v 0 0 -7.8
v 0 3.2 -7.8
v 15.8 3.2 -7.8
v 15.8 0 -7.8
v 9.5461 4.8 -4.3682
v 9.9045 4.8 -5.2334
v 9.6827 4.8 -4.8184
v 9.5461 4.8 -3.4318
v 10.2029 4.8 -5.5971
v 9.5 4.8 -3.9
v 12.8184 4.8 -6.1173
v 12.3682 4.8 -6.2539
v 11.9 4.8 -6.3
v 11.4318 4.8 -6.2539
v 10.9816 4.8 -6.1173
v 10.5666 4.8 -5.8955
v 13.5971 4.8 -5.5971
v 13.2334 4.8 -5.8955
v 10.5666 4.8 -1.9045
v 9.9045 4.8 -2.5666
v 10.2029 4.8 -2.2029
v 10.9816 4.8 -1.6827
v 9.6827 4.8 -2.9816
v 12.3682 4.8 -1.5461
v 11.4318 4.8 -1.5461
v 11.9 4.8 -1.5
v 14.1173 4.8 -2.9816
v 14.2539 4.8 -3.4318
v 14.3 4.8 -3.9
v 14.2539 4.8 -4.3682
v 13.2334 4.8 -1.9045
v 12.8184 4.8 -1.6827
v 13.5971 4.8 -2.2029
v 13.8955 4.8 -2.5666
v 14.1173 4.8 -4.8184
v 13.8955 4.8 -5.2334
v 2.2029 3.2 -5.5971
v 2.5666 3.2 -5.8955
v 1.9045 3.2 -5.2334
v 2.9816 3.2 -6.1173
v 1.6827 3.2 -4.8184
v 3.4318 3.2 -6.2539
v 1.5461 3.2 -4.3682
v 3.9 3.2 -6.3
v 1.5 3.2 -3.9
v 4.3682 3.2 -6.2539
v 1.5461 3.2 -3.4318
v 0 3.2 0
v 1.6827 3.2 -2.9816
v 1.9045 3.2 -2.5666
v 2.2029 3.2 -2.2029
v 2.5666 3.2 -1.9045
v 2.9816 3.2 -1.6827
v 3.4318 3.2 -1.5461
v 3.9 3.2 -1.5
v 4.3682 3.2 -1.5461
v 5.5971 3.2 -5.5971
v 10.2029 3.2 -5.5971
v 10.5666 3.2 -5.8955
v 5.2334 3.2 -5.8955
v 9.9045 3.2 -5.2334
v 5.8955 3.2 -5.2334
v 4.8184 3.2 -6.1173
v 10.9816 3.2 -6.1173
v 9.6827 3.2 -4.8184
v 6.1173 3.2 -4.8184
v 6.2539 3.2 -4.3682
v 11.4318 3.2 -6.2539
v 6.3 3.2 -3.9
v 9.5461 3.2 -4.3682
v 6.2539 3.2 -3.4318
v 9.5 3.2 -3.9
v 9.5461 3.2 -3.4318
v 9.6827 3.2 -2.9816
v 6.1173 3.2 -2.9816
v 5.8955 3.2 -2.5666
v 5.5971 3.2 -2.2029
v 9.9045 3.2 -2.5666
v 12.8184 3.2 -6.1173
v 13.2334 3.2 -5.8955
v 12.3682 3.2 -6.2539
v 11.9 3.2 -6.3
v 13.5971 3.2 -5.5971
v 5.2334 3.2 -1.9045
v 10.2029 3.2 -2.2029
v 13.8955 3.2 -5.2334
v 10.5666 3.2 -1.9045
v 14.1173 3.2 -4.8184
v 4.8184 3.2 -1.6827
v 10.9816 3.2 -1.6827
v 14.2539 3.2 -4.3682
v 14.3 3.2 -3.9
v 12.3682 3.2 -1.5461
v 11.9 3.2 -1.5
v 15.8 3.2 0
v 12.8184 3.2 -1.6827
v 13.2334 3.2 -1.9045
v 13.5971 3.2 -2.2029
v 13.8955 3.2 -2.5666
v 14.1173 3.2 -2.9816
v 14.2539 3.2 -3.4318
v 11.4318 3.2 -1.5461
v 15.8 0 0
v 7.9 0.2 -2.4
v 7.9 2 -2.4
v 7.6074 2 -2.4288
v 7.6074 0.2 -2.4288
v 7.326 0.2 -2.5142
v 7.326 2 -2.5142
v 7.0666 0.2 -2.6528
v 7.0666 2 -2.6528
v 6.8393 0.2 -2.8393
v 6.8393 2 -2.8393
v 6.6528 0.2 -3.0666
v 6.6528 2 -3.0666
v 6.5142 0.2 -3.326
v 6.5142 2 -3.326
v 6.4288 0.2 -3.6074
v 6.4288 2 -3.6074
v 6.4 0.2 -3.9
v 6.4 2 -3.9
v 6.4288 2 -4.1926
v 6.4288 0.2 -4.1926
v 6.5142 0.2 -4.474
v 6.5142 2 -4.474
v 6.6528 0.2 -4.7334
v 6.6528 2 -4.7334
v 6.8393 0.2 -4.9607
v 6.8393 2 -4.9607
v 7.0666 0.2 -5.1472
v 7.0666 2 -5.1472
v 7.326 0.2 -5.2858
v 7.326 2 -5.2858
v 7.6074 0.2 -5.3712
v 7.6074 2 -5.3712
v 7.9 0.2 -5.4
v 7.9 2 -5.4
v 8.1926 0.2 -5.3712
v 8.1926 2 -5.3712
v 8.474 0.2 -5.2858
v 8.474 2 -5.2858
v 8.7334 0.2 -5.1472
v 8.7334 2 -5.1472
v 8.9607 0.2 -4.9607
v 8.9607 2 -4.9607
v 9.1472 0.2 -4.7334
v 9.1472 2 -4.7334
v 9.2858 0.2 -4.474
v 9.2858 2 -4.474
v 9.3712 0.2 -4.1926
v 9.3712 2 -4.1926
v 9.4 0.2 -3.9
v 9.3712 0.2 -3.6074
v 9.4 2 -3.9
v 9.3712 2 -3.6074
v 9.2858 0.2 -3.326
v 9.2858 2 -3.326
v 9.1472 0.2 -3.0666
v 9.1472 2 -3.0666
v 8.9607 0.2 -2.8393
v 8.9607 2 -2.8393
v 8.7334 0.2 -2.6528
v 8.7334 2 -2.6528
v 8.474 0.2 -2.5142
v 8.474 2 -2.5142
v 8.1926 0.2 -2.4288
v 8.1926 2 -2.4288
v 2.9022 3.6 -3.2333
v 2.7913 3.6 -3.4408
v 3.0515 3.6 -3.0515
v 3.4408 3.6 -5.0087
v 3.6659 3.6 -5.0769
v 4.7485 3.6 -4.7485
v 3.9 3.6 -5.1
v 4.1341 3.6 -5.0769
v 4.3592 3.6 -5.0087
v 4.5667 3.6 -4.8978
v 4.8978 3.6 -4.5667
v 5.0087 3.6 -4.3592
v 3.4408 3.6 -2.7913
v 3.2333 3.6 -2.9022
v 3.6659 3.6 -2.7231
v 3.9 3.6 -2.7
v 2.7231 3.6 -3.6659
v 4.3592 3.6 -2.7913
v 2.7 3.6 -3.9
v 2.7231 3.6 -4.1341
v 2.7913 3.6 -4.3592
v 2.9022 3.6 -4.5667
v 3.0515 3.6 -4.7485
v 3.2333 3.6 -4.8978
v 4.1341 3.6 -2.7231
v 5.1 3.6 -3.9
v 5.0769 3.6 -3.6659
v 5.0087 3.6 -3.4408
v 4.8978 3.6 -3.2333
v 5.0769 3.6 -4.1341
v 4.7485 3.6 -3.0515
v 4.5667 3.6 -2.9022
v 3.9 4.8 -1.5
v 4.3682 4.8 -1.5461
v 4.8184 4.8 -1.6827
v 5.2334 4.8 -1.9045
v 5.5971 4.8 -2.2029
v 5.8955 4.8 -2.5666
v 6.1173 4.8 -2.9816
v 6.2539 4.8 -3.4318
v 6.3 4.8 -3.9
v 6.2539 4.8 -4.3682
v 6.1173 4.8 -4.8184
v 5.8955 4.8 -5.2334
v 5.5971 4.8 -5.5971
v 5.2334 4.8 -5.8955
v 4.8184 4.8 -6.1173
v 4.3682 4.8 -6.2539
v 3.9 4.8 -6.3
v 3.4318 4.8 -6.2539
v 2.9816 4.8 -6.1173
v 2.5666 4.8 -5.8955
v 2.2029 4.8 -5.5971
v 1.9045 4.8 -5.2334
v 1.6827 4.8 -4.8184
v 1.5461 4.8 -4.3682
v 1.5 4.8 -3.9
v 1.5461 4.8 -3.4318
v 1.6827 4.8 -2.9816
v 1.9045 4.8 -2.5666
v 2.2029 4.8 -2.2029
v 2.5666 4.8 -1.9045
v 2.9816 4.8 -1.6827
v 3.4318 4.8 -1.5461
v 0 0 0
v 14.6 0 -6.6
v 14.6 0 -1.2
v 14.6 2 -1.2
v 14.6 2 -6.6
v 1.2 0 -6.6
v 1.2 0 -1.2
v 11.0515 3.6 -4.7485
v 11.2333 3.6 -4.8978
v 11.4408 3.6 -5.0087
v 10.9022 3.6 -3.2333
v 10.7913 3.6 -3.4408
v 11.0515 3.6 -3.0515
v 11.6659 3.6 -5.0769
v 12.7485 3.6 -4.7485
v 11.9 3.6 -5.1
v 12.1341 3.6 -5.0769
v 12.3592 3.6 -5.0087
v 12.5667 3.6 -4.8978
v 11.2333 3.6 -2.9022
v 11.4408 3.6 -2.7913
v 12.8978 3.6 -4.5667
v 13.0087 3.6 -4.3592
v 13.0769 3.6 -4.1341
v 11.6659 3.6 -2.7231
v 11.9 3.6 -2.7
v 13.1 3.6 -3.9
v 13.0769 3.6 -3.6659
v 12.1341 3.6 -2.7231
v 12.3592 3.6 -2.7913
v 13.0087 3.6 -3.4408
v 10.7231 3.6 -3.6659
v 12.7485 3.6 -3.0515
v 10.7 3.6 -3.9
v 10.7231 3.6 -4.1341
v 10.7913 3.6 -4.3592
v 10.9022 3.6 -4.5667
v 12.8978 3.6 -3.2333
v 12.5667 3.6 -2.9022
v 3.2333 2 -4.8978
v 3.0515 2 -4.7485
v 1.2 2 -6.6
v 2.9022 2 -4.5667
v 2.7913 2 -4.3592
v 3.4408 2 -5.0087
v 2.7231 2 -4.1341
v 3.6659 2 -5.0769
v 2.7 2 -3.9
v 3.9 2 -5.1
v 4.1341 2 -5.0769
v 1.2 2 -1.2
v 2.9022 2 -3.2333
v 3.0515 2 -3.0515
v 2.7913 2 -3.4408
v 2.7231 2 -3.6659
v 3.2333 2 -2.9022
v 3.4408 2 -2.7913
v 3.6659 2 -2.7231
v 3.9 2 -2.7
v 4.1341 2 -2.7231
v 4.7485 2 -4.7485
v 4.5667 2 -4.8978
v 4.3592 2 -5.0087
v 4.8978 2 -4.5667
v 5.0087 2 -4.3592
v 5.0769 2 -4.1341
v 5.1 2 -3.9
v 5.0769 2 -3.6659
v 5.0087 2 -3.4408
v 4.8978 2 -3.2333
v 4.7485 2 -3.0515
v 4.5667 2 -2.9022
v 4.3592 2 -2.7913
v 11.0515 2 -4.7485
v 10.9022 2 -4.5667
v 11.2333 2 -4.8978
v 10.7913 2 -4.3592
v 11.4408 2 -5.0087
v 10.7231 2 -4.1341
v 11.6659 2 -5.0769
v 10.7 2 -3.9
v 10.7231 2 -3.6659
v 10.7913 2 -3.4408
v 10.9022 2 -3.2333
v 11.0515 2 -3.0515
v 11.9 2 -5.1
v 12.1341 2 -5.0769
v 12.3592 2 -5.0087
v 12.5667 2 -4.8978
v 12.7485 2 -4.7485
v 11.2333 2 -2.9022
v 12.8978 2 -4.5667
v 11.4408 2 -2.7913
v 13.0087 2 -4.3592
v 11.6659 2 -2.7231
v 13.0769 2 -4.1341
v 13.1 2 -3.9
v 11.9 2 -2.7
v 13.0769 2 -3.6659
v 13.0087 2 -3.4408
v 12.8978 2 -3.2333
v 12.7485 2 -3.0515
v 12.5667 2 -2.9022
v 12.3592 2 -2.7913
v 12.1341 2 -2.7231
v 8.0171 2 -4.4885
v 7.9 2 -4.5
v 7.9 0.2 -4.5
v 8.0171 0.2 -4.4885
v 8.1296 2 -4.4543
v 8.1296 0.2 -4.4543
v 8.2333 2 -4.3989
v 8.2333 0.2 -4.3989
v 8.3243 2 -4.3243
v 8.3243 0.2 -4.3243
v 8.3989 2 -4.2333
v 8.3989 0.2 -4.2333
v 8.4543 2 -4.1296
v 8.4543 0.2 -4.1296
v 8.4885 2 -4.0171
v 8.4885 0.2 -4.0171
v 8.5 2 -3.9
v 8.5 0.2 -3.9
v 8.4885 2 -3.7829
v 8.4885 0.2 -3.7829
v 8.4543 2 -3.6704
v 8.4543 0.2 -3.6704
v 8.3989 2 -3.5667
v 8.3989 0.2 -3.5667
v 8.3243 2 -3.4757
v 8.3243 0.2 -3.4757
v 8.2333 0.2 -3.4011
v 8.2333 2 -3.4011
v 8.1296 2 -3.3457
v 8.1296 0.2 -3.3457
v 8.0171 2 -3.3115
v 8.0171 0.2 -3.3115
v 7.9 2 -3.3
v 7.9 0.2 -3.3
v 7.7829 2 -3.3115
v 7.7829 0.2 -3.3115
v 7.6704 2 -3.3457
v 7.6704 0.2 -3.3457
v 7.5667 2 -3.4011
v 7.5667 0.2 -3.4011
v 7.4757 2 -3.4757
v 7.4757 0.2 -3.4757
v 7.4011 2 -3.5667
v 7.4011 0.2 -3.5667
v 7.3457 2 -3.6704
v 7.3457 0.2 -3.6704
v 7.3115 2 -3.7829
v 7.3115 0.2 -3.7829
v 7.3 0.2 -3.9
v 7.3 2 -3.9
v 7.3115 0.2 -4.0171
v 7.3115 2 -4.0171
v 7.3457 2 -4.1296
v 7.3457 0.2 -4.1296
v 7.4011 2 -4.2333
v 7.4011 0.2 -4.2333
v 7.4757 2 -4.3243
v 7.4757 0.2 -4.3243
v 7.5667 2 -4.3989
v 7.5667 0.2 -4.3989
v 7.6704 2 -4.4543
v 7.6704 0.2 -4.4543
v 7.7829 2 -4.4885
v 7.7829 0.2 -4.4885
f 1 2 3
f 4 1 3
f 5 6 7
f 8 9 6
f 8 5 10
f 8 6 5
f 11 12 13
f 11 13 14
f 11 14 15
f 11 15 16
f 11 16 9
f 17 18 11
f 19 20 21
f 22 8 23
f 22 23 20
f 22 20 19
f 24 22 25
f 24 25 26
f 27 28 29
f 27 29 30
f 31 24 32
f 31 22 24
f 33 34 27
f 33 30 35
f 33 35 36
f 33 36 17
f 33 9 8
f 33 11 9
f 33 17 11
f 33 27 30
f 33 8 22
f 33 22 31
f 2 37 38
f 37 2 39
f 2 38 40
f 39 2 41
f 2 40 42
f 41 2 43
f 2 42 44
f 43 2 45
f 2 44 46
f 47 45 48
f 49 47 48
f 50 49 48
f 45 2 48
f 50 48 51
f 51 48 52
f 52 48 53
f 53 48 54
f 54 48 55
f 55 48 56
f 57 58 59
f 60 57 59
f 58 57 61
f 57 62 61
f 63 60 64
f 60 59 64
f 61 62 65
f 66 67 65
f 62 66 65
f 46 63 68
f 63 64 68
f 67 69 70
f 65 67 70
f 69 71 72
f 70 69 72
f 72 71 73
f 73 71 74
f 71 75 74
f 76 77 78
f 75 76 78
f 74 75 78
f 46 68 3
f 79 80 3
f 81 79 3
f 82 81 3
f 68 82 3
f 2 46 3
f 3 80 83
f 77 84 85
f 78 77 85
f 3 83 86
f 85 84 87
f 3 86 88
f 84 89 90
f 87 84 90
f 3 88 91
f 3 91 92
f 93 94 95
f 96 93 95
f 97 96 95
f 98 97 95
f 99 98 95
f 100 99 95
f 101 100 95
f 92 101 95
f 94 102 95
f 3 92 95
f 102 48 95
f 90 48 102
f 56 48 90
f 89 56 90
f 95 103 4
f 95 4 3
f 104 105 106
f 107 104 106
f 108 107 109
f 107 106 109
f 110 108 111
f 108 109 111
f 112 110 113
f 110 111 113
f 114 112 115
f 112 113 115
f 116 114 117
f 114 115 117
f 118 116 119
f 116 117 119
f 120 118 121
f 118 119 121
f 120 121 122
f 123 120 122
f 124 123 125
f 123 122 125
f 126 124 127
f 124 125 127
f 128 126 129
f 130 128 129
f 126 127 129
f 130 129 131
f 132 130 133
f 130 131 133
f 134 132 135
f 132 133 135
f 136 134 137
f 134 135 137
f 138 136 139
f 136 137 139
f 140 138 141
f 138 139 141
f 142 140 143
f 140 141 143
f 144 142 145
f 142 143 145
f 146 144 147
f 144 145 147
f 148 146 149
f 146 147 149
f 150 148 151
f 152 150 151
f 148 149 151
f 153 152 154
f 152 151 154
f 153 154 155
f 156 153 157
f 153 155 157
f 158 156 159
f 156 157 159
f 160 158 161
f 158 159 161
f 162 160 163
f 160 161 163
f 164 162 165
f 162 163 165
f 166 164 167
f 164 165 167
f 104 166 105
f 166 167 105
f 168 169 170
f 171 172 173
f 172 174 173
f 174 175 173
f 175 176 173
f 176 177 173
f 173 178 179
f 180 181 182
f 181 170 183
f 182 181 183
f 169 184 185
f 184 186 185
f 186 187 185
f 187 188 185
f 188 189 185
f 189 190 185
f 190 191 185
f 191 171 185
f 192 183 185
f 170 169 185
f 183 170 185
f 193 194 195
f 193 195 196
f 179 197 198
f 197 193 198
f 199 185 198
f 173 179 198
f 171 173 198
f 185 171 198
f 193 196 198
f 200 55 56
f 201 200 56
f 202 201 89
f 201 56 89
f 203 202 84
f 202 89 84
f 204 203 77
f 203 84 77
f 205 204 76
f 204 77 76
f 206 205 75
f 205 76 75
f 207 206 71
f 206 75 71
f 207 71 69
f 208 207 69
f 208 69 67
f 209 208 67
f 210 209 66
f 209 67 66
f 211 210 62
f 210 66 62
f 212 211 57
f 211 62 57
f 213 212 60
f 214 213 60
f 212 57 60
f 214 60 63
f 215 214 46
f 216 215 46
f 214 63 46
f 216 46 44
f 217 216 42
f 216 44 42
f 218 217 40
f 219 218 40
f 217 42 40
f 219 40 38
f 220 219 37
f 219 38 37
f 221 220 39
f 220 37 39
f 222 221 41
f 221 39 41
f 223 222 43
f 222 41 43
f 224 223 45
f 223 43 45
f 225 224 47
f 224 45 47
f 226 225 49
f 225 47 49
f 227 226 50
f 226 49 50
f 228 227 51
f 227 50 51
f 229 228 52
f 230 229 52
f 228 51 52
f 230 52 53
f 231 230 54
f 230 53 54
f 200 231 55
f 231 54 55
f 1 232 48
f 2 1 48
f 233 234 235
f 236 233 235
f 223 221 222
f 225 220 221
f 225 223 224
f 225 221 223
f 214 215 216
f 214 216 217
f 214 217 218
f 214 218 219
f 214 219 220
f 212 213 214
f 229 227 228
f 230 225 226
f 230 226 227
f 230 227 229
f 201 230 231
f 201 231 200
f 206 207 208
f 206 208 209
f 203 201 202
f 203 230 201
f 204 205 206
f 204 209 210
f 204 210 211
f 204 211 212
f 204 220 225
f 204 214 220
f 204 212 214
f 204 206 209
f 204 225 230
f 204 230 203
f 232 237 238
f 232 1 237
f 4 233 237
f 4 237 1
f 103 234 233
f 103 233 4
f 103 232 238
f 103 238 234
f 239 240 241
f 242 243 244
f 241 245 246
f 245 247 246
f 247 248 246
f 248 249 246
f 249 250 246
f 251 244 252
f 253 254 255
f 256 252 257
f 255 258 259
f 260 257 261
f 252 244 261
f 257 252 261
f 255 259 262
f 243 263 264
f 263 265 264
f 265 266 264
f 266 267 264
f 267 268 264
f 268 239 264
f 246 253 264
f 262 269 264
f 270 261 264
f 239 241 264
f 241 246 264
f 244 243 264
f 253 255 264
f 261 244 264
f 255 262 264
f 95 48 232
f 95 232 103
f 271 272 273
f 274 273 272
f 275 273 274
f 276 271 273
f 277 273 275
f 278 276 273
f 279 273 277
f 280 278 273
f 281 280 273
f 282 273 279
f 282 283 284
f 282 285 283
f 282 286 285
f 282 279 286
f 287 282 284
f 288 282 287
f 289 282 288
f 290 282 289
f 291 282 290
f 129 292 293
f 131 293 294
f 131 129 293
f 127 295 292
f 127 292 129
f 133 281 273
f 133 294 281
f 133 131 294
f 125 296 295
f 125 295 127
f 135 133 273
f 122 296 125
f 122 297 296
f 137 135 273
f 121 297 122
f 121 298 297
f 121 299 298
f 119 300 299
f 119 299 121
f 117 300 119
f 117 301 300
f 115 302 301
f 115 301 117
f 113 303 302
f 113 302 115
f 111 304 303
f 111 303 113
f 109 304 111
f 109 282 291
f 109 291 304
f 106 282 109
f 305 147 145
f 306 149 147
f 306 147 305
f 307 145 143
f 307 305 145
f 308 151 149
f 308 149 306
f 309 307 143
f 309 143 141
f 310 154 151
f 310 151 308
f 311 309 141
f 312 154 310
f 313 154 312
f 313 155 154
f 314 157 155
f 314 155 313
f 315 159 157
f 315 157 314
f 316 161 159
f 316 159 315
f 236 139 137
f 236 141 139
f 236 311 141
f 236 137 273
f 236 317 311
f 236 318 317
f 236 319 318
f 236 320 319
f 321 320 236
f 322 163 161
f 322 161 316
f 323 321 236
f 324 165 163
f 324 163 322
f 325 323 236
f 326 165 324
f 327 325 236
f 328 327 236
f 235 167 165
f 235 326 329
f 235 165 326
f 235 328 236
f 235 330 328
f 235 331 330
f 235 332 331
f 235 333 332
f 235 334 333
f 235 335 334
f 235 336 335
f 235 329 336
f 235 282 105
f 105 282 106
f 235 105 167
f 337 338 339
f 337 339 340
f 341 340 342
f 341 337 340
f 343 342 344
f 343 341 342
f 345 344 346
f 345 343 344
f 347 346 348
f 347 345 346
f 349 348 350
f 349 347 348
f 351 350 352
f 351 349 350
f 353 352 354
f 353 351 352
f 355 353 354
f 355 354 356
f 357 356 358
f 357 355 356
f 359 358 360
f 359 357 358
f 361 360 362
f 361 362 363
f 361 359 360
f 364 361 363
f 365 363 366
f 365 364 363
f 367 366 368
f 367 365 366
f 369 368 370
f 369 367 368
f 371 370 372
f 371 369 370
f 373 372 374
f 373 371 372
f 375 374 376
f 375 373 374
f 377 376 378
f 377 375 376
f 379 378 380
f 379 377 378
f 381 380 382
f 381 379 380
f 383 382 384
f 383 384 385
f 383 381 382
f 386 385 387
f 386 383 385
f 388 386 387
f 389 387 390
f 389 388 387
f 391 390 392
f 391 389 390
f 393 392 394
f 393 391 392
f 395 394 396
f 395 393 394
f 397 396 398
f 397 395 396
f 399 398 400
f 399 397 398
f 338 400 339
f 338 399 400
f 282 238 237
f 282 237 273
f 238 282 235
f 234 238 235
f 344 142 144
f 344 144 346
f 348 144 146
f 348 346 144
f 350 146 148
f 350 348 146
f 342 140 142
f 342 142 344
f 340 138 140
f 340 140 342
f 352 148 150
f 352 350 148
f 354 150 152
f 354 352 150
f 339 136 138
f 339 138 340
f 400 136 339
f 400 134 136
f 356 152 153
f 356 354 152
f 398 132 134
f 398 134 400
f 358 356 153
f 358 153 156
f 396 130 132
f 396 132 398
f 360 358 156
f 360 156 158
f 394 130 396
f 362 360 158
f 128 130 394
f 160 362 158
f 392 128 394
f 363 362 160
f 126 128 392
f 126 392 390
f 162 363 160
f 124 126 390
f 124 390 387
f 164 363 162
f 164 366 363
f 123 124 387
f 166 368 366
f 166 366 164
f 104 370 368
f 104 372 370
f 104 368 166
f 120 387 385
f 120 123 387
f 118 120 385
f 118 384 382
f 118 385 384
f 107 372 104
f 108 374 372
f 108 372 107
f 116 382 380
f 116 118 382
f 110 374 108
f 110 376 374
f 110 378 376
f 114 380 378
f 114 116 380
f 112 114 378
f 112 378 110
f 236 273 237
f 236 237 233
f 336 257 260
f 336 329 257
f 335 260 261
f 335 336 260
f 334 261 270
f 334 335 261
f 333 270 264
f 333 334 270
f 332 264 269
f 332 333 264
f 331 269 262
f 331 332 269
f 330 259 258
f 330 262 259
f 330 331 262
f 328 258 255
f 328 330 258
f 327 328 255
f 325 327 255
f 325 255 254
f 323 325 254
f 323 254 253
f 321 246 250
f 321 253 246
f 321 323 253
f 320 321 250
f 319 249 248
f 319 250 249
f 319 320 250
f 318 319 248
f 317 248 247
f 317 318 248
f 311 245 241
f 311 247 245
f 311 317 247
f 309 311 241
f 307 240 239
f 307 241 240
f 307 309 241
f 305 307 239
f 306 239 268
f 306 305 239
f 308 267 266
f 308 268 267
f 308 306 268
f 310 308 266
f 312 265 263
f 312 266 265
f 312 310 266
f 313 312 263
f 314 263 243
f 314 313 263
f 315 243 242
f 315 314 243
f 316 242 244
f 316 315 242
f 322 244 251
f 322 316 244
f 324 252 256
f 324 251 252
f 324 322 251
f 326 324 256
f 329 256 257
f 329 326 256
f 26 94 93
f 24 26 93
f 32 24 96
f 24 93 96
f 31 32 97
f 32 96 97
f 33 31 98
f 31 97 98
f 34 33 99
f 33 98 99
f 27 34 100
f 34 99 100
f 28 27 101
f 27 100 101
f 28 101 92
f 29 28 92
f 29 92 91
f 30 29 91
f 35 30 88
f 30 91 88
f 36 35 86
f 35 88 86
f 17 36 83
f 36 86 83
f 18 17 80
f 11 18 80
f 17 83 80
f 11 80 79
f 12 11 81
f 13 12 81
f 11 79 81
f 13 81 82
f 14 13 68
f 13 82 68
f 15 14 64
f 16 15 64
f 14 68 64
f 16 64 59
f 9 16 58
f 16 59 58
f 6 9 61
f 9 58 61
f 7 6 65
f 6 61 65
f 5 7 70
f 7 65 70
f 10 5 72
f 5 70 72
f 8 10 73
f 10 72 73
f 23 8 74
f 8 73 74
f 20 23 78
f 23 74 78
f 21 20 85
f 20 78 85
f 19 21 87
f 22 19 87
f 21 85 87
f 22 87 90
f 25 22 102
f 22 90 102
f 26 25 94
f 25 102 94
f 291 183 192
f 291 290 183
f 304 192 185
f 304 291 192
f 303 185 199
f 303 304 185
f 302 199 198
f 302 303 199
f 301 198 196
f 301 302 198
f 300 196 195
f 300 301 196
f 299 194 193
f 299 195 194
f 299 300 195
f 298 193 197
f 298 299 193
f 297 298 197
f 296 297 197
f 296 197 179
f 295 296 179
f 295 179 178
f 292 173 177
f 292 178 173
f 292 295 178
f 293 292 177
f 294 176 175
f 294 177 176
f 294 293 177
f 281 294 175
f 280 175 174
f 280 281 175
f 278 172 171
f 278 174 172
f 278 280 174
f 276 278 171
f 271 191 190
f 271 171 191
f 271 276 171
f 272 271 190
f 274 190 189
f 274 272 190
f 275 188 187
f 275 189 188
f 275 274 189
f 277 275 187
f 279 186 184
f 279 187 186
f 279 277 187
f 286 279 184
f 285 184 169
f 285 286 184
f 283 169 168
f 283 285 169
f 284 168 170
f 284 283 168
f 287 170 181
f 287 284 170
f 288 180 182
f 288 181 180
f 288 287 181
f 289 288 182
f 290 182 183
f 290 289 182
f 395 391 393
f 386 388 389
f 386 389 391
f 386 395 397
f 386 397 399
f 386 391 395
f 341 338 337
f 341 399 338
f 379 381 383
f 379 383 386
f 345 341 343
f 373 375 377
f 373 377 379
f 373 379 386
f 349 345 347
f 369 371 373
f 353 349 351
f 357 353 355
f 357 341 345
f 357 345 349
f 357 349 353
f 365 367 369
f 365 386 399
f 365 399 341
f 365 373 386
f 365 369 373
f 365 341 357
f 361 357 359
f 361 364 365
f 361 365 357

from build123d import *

# Parameters (mm, degrees)
SKETCH1_W            = 15.8
SKETCH1_H            = 3.2
BOSS_EXTRUDE1_DEPTH  = 7.8
SKETCH2_R            = 2.4
BOSS_EXTRUDE2_DEPTH  = 1.6
LPATTERN1_COUNT      = 2
LPATTERN1_PITCH      = 8
LPATTERN1_COUNT_DIR2 = 6
LPATTERN1_PITCH_DIR2 = 8
SHELL1_T             = -1.2
SKETCH3_R            = 1.5
SKETCH3_R_2          = 0.6
BOSS_EXTRUDE3_DEPTH  = 1.8


with BuildPart() as part:
    # Sketch1 → Boss-Extrude1 (new body)
    with BuildSketch(Plane.XY):
        with Locations((7.9, 1.6)):
            Rectangle(SKETCH1_W, SKETCH1_H)
    extrude(amount=-BOSS_EXTRUDE1_DEPTH)

    # Sketch2 → Boss-Extrude2 (add)
    with BuildSketch(Plane(origin=(0, 3.2, 0), x_dir=(1, 0, 0), z_dir=(0, 1, 0))):
        with Locations(Location((3.9, 3.9, 0), (0, 0, 270))):
            Circle(SKETCH2_R)
    boss_extrude2 = extrude(amount=BOSS_EXTRUDE2_DEPTH)

    # LPattern1: Boss-Extrude2 2 × 6, 10 skipped
    with Locations(*[(j * LPATTERN1_PITCH_DIR2, 0, i * LPATTERN1_PITCH) for i in range(LPATTERN1_COUNT) for j in range(LPATTERN1_COUNT_DIR2) if (i, j) not in ((0, 0), (0, 2), (0, 3), (0, 4), (0, 5), (1, 0), (1, 1), (1, 2), (1, 3), (1, 4), (1, 5))]):
        add(boss_extrude2)

    # Shell1
    shell1_openings = [part.faces().sort_by_distance(p)[0] for p in [
        (7.9, 0, -3.9),
    ]]
    offset(amount=SHELL1_T, openings=shell1_openings, kind=Kind.INTERSECTION)

    # Sketch3 → Boss-Extrude3 (add)
    with BuildSketch(Plane.XZ.offset(-2)):
        with Locations(Location((7.9, -3.9, 0), (0, 0, 90))):
            Circle(SKETCH3_R)
        with Locations(Location((7.9, -3.9, 0), (0, 0, 270))):
            Circle(SKETCH3_R_2, mode=Mode.SUBTRACT)
    extrude(amount=BOSS_EXTRUDE3_DEPTH)


solid = part.part
